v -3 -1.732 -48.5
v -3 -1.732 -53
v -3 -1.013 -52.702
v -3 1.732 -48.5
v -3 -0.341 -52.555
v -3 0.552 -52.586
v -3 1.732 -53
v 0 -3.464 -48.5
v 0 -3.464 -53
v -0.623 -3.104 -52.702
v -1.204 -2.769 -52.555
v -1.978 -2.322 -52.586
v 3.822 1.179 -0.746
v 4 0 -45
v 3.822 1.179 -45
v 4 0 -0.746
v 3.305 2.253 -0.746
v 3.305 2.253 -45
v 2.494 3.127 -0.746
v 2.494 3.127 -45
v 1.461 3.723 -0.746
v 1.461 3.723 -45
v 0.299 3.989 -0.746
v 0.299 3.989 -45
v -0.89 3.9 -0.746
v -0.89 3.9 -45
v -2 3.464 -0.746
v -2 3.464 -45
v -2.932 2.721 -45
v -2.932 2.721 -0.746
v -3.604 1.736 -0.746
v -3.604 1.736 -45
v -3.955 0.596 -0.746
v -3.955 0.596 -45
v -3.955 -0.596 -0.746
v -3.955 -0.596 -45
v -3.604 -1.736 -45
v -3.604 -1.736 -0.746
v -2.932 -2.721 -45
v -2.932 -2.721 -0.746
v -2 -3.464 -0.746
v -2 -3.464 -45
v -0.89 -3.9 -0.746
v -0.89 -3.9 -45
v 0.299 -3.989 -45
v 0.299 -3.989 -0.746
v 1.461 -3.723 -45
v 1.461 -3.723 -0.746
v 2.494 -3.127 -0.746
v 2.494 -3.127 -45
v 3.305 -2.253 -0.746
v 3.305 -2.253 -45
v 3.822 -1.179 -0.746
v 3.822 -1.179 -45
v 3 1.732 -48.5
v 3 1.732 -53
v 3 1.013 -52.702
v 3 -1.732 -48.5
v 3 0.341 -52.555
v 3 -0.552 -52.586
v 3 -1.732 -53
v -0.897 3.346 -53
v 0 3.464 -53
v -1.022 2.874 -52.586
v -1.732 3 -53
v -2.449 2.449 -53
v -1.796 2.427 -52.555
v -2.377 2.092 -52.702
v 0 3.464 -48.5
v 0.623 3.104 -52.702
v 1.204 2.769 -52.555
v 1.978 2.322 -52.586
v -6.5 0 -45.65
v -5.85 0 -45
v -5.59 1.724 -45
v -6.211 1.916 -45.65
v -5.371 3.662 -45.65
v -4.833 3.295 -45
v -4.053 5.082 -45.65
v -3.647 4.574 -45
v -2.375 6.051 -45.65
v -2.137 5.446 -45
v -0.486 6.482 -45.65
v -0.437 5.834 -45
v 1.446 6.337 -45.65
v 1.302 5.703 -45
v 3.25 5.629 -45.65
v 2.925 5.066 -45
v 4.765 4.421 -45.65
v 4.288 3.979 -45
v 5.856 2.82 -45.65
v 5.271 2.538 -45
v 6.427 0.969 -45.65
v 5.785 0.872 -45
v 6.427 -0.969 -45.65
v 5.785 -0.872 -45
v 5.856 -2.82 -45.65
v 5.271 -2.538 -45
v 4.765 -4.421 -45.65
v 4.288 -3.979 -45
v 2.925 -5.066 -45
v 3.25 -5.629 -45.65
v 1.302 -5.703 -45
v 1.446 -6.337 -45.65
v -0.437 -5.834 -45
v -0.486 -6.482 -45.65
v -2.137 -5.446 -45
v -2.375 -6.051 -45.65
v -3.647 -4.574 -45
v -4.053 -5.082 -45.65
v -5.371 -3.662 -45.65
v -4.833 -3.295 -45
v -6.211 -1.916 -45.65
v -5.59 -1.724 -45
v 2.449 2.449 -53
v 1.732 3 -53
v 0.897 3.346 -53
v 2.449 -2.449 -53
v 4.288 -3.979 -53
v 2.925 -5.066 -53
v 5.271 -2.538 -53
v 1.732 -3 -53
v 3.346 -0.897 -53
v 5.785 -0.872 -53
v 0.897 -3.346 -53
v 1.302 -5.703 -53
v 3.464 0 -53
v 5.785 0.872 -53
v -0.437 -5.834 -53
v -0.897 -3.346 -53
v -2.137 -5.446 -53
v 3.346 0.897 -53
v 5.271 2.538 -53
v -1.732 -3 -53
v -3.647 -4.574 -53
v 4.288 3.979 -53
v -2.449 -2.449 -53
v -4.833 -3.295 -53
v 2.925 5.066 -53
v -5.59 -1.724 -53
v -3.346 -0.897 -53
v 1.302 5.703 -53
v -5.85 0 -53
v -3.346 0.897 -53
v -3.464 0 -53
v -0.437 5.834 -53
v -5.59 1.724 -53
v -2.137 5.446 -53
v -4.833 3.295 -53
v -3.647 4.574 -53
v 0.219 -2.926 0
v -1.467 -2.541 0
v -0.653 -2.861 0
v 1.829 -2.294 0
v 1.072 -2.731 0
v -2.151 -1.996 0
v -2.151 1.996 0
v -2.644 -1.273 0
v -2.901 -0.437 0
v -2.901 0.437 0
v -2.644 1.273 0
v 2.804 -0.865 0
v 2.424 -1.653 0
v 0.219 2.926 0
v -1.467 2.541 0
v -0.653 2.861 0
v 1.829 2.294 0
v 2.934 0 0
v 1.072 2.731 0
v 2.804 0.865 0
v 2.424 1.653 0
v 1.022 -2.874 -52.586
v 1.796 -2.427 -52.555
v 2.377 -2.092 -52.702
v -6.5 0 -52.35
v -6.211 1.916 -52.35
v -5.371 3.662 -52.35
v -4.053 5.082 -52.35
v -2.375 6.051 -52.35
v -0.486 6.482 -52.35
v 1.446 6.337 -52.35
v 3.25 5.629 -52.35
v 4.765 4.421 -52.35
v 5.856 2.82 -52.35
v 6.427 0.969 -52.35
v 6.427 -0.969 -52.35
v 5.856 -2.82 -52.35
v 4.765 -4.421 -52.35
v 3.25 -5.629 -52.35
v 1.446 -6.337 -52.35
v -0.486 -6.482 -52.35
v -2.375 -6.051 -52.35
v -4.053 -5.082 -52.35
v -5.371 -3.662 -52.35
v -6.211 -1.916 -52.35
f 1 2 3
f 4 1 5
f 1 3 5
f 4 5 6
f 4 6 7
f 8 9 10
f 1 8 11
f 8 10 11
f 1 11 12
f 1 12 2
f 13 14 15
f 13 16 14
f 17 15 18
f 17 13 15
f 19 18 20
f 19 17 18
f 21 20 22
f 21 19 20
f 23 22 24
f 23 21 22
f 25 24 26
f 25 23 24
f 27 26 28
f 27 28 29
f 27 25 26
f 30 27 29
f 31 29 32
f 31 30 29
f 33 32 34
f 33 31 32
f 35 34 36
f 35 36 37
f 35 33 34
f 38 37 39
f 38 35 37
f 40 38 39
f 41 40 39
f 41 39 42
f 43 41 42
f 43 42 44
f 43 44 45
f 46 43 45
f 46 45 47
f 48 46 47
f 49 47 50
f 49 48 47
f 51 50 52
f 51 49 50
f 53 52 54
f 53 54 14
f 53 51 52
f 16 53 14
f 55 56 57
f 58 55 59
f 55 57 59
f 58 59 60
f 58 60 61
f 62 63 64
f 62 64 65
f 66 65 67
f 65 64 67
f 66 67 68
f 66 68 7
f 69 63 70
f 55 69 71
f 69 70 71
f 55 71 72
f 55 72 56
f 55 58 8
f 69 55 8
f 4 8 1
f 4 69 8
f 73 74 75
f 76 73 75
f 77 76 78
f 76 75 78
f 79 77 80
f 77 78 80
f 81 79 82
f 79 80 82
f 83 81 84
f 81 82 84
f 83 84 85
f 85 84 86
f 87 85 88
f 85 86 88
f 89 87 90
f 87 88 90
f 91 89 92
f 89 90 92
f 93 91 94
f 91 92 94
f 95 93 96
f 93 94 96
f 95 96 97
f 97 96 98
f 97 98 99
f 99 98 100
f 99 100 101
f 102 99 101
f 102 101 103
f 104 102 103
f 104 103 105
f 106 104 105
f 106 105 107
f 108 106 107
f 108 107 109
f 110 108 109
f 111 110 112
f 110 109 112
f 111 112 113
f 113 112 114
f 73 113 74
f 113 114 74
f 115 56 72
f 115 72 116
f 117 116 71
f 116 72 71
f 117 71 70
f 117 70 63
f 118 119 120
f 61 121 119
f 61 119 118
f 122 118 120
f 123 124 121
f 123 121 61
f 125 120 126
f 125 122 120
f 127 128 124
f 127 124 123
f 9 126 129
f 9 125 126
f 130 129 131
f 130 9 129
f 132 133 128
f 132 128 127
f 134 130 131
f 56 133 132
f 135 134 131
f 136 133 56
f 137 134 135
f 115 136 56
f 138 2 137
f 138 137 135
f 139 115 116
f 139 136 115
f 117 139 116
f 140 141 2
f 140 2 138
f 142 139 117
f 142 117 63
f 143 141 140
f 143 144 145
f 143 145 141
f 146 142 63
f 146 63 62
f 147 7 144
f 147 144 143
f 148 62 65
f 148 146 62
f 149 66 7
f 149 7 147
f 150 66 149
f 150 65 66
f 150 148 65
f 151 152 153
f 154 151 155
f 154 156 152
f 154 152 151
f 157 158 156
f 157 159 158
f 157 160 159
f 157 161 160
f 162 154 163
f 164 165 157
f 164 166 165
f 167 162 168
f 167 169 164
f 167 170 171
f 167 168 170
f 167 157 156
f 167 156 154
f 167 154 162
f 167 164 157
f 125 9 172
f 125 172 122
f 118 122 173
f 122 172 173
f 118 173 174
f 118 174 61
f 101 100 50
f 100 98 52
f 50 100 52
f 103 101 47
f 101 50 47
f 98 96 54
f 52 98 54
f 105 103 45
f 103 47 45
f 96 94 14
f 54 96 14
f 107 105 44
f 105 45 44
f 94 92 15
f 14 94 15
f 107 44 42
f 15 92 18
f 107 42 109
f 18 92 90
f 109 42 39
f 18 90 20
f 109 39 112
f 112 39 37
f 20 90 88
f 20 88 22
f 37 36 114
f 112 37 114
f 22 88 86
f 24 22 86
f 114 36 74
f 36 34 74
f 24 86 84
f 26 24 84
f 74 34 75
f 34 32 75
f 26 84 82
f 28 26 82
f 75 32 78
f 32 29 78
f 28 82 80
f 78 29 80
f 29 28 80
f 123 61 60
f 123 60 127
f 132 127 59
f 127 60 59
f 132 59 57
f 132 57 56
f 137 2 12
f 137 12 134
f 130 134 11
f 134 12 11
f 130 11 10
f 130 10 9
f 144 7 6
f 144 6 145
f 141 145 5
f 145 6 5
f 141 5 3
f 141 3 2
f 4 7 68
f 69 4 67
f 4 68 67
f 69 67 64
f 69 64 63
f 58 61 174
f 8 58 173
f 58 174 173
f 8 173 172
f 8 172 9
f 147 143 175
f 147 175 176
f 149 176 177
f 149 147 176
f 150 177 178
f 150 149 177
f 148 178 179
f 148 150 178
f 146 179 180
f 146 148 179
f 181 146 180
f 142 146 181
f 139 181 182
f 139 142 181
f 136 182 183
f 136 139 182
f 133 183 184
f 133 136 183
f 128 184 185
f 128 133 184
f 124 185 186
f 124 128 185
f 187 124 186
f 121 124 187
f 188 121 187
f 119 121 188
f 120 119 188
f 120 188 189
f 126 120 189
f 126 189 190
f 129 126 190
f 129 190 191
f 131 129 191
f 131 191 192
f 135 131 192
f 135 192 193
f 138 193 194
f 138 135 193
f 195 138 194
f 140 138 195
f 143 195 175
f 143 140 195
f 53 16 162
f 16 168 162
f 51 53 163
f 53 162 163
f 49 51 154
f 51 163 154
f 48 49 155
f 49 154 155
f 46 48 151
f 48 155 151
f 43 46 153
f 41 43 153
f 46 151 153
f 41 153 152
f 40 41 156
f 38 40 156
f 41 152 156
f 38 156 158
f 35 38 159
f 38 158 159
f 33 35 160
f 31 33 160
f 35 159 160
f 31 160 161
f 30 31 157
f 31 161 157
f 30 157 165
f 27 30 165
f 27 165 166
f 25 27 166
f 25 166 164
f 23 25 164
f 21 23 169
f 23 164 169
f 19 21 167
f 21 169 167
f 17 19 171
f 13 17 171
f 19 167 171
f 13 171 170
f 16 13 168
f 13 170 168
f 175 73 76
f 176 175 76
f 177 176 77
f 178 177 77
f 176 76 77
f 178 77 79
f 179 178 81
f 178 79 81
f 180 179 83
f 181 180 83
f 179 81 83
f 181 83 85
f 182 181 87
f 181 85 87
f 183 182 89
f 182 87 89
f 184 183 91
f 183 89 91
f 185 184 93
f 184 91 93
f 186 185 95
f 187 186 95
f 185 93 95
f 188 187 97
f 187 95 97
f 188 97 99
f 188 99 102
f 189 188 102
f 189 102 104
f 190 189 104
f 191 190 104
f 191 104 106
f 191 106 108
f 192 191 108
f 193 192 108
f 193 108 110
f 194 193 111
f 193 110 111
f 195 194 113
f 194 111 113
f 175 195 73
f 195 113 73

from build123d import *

# Parameters (mm, degrees)
SKETCH1_R            = 4
EXTRUDE1_DEPTH       = 45
SKETCH6_R            = 6.5
EXTRUDE2_DEPTH       = 8
CUT_EXTRUDE1_DEPTH   = 4.5
CHAMFER1_SIZE        = 0.65
SKETCH10_R           = 4
PARTIAL_THREAD_DEPTH = 17
CHAMFER2_SIZE        = 0.16


with BuildPart() as part:
    # Sketch1 → Extrude1 (new body)
    with BuildSketch(Plane.XY):
        Circle(SKETCH1_R)
    extrude(amount=-EXTRUDE1_DEPTH)

    # Sketch4 → Cut-Revolve1 (revolve, cut)
    with BuildSketch(Plane(origin=(0, 0, 0), x_dir=(0, 0, -1), z_dir=(1, 0, 0)), mode=Mode.PRIVATE) as cut_revolve1_sk:
        Polygon((0.746350386, 4), (0, 2.934101184), (0, 4), align=None)
    revolve(cut_revolve1_sk.sketch.rotate(Axis((0, 0, 0), (0, 0, -1)), 90), axis=Axis((0, 0, 0), (0, 0, -1)), mode=Mode.SUBTRACT)

    # Sketch6 → Extrude2 (add)
    with BuildSketch(Plane(origin=(0, 0, -45), x_dir=(-1, 0, 0), z_dir=(0, 0, -1))):
        Circle(SKETCH6_R)
    extrude(amount=EXTRUDE2_DEPTH)

    # Sketch7 → Cut-Extrude1 (cut)
    with BuildSketch(Plane(origin=(0, 0, -53), x_dir=(-1, 0, 0), z_dir=(0, 0, -1))):
        Polygon((0, 3.464101615), (-3, 1.732050808), (-3, -1.732050808), (0, -3.464101615), (3, -1.732050808), (3, 1.732050808), align=None)
    extrude(amount=-CUT_EXTRUDE1_DEPTH, mode=Mode.SUBTRACT)

    # Cut-Extrude2 cone 1 section (through the dimple's axis) → Cut-Extrude2 (revolve, cut)
    with BuildSketch(Plane(origin=(0, 0, -53), x_dir=(0, 1, 0), z_dir=(1, 0, 0))):
        Polygon((0, 0), (3.464101615, 0), (0, 3.464101615), align=None)
    revolve(axis=Axis((0, 0, -53), (0, 0, 1)), mode=Mode.SUBTRACT)

    # Chamfer1
    chamfer1_edges = [part.edges().sort_by_distance(p)[0] for p in [
        (6.5, 0, -45),
        (6.5, 0, -53),
    ]]
    chamfer(chamfer1_edges, length=CHAMFER1_SIZE)


with BuildPart() as body_2:
    # Sketch10 → partial thread (new body)
    with BuildSketch(Plane.XY.offset(-45)):
        Circle(SKETCH10_R)
    extrude(amount=PARTIAL_THREAD_DEPTH)

    # Chamfer2
    chamfer2_edges = [body_2.edges().sort_by_distance(p)[0] for p in [
        (-4, 0, -28),
    ]]
    chamfer(chamfer2_edges, length=CHAMFER2_SIZE)


with BuildPart() as part_1:
    add(part.part)

    # Combine1: union body 2
    add(body_2.part)


solid = part_1.part
